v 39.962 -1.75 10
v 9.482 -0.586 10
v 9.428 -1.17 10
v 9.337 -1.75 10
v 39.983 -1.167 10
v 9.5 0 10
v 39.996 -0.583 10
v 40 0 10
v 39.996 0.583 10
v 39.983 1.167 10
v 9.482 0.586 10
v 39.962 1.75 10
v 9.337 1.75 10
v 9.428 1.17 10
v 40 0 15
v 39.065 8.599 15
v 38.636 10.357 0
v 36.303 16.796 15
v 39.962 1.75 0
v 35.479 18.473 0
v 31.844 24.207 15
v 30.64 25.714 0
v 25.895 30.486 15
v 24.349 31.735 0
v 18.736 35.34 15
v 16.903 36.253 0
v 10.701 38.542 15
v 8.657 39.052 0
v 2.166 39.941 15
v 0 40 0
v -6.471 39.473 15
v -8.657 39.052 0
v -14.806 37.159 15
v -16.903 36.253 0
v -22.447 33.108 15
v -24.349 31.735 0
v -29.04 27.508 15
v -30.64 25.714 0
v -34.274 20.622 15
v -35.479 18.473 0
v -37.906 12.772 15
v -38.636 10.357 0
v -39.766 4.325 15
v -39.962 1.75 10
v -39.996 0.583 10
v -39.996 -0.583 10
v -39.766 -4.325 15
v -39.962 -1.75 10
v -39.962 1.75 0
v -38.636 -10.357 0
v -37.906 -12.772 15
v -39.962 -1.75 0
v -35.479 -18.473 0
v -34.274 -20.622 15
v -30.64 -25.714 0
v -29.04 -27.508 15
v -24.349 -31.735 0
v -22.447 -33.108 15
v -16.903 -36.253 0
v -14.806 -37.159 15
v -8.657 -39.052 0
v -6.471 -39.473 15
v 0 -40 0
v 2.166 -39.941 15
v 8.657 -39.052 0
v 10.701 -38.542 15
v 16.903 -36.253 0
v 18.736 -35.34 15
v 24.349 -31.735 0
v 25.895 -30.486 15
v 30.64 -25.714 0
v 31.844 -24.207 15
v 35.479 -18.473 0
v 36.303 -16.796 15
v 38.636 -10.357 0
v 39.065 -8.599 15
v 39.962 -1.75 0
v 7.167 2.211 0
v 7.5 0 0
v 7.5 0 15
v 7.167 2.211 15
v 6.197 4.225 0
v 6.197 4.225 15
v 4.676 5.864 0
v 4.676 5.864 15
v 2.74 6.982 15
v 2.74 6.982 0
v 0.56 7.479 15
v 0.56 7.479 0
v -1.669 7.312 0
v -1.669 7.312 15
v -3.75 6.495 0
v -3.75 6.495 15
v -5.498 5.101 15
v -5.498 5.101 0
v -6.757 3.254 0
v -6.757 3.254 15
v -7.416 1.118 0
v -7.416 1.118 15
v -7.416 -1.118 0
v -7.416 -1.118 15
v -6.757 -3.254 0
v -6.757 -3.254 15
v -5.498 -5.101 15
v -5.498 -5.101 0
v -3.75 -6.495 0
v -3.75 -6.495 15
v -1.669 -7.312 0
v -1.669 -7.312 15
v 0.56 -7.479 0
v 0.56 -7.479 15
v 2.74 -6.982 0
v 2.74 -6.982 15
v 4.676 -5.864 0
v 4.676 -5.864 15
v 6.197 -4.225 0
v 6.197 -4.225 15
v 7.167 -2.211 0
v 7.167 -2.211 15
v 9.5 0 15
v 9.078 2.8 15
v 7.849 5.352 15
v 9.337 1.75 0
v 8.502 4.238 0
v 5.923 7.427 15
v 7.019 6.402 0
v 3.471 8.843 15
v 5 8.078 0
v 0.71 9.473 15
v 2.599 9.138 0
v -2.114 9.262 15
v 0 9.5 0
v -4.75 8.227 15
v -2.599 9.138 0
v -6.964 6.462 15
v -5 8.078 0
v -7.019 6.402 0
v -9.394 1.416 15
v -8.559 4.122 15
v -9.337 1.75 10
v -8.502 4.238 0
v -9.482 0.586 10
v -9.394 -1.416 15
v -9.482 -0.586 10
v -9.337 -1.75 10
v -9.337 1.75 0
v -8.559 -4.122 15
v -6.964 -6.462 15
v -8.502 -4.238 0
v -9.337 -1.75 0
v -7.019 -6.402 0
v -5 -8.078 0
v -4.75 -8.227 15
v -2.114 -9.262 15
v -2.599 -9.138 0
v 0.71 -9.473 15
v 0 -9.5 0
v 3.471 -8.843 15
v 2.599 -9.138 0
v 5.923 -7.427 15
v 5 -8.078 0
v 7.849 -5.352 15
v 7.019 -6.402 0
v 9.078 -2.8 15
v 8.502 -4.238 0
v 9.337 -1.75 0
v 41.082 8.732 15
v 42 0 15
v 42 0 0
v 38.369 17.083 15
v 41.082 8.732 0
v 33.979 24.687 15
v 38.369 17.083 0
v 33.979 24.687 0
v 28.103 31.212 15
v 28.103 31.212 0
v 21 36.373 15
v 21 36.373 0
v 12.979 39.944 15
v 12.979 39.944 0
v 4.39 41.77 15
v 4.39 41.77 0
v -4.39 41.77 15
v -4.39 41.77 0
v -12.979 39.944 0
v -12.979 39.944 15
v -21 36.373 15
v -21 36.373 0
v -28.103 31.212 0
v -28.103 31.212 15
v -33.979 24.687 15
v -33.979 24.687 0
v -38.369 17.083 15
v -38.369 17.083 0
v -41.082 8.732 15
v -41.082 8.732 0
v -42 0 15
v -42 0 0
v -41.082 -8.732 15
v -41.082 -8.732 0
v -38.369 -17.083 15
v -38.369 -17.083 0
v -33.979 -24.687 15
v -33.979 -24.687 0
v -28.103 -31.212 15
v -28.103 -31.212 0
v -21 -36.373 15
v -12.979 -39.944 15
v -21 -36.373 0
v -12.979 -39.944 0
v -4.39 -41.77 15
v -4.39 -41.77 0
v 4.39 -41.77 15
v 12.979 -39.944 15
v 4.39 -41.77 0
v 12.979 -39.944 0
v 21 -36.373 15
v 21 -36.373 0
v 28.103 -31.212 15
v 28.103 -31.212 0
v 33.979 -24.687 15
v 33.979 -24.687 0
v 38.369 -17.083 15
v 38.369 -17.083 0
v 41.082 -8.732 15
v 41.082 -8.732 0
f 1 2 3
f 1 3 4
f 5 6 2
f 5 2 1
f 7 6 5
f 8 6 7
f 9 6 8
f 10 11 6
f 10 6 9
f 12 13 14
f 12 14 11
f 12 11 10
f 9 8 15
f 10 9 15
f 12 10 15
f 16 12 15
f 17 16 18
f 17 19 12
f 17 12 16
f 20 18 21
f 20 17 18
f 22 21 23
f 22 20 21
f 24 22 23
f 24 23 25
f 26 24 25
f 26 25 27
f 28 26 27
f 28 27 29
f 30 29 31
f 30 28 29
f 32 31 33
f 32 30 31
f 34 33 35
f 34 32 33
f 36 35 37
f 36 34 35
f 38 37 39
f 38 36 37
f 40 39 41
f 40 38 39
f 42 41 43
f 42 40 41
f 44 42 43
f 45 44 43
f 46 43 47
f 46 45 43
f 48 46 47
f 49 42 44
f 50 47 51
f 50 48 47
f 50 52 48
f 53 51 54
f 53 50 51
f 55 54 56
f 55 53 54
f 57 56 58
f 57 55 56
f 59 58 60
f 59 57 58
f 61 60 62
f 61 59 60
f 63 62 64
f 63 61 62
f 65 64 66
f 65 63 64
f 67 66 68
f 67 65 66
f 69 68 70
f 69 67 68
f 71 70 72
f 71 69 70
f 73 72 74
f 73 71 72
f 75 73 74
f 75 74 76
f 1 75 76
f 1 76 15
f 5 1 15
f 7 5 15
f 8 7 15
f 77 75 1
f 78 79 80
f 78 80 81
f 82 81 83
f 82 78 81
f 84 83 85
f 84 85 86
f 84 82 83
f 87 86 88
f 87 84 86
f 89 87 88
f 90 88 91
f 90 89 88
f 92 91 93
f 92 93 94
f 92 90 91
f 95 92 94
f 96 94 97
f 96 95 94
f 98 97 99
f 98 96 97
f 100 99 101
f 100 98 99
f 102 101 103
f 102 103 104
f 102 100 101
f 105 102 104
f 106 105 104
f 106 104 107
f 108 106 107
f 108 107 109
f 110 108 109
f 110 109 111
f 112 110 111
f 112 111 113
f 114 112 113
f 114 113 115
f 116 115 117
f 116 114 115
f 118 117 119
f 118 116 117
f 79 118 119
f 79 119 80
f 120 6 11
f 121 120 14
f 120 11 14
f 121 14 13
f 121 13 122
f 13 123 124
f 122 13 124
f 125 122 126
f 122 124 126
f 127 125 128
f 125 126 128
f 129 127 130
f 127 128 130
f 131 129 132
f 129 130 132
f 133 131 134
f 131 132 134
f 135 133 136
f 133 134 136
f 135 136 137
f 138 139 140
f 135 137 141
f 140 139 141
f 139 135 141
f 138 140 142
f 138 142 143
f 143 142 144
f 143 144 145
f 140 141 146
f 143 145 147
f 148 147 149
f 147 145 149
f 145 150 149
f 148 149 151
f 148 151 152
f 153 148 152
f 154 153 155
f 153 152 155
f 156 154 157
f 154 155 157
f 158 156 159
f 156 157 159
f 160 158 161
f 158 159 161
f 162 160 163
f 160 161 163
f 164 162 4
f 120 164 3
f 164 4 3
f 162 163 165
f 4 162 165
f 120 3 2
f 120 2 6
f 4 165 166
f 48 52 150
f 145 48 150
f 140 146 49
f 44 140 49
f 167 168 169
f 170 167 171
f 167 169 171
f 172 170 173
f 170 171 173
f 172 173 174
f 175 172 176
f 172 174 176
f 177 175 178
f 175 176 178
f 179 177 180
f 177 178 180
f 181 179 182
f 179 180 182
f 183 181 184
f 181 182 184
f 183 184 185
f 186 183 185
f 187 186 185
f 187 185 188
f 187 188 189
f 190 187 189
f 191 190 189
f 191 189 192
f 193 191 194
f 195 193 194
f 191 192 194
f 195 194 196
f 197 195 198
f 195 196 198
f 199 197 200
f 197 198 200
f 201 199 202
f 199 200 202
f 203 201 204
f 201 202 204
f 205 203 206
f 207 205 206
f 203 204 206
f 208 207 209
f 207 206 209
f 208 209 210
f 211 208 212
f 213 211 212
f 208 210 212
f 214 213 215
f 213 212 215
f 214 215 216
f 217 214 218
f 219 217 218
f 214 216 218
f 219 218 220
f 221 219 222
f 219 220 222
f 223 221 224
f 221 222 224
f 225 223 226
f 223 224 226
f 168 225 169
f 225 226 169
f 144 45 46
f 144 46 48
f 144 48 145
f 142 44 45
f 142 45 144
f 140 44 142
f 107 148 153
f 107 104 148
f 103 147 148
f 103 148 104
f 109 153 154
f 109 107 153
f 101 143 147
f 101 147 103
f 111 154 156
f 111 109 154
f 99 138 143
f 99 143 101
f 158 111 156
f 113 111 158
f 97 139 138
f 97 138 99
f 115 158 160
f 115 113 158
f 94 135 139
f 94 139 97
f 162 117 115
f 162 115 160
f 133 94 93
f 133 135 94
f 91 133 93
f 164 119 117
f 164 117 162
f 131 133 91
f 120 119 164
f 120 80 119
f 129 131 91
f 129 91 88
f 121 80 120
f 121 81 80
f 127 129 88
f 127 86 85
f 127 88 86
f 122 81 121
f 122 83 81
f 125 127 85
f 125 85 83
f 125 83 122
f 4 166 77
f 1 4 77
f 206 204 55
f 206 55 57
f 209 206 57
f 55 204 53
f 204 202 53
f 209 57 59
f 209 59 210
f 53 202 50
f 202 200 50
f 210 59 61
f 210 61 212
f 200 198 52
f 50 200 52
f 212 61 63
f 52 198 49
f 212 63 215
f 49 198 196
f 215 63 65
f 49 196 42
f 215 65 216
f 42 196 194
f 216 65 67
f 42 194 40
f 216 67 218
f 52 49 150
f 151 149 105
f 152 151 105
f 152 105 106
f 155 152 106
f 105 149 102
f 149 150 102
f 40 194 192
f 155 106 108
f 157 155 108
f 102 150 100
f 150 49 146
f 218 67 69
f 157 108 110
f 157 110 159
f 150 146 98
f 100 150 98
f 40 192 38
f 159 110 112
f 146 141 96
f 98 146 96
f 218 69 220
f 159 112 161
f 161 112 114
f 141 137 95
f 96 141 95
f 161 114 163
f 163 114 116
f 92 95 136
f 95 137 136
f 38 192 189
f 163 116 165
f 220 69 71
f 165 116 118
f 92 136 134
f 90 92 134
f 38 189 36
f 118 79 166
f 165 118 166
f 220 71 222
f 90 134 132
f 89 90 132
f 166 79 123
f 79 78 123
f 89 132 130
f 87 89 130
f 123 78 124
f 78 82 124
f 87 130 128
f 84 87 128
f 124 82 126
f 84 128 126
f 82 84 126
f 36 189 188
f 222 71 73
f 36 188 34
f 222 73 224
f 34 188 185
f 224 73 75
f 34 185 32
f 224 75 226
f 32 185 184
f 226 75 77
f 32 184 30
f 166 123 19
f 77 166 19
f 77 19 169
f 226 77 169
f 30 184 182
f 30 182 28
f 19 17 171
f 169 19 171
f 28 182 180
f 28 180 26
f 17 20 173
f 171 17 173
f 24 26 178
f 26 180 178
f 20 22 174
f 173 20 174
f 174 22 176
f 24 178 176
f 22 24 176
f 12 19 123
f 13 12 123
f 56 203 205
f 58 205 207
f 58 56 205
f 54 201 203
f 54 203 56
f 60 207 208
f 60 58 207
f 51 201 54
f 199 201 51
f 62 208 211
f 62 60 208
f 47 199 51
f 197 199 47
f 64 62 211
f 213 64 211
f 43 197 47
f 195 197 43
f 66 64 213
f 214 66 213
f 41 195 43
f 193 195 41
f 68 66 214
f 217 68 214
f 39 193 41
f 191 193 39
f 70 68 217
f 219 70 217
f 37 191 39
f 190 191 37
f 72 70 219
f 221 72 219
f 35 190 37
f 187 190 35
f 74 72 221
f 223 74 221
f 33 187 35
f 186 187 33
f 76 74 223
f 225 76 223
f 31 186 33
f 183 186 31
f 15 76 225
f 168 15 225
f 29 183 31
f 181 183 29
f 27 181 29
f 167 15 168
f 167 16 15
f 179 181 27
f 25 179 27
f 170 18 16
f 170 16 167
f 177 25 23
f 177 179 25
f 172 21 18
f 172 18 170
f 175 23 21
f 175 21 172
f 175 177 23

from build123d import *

# Parameters (mm, degrees)
F0_R     = 42
F0_R_2   = 40
F1_DEPTH = 15
F0_R_3   = 9.5
F0_R_4   = 7.5
F3_DEPTH = 10


with BuildPart() as f1:
    # F0 (on Top) → F1 (new body)
    with BuildSketch(Plane.XY):
        Circle(F0_R)
        Circle(F0_R_2, mode=Mode.SUBTRACT)
    extrude(amount=F1_DEPTH)



with BuildPart() as f1b:
    # F0 (on Top) → F1, piece 2 (new body)
    with BuildSketch(Plane.XY):
        Circle(F0_R_3)
        Circle(F0_R_4, mode=Mode.SUBTRACT)
    extrude(amount=F1_DEPTH)


with BuildPart() as f1_1:
    add(f1.part)

    add(f1b.part)  # F3 merges F1b
    # F2 (on Top) → F3 (join)
    with BuildSketch(Plane.XY):
        with BuildLine():
            ThreePointArc((39.9617004143, -1.75), (39.9904239573, -0.8752095261), (40, 0))
            ThreePointArc((40, 0), (39.9904239573, 0.8752095261), (39.9617004143, 1.75))
            Line((39.9617004143, 1.75), (9.3374246985, 1.75))
            ThreePointArc((9.3374246985, 1.75), (9.4592688575, 0.8787677066), (9.5, 0))
            ThreePointArc((9.5, 0), (9.4592688575, -0.8787677066), (9.3374246985, -1.75))
            Line((9.3374246985, -1.75), (39.9617004143, -1.75))
        make_face()
        with BuildLine():
            Line((-9.3374246985, 1.75), (-39.9617004143, 1.75))
            ThreePointArc((-39.9617004143, 1.75), (-40, 0), (-39.9617004143, -1.75))
            Line((-39.9617004143, -1.75), (-9.3374246985, -1.75))
            ThreePointArc((-9.3374246985, -1.75), (-9.5, 0), (-9.3374246985, 1.75))
        make_face()
    extrude(amount=F3_DEPTH)


solid = f1_1.part
